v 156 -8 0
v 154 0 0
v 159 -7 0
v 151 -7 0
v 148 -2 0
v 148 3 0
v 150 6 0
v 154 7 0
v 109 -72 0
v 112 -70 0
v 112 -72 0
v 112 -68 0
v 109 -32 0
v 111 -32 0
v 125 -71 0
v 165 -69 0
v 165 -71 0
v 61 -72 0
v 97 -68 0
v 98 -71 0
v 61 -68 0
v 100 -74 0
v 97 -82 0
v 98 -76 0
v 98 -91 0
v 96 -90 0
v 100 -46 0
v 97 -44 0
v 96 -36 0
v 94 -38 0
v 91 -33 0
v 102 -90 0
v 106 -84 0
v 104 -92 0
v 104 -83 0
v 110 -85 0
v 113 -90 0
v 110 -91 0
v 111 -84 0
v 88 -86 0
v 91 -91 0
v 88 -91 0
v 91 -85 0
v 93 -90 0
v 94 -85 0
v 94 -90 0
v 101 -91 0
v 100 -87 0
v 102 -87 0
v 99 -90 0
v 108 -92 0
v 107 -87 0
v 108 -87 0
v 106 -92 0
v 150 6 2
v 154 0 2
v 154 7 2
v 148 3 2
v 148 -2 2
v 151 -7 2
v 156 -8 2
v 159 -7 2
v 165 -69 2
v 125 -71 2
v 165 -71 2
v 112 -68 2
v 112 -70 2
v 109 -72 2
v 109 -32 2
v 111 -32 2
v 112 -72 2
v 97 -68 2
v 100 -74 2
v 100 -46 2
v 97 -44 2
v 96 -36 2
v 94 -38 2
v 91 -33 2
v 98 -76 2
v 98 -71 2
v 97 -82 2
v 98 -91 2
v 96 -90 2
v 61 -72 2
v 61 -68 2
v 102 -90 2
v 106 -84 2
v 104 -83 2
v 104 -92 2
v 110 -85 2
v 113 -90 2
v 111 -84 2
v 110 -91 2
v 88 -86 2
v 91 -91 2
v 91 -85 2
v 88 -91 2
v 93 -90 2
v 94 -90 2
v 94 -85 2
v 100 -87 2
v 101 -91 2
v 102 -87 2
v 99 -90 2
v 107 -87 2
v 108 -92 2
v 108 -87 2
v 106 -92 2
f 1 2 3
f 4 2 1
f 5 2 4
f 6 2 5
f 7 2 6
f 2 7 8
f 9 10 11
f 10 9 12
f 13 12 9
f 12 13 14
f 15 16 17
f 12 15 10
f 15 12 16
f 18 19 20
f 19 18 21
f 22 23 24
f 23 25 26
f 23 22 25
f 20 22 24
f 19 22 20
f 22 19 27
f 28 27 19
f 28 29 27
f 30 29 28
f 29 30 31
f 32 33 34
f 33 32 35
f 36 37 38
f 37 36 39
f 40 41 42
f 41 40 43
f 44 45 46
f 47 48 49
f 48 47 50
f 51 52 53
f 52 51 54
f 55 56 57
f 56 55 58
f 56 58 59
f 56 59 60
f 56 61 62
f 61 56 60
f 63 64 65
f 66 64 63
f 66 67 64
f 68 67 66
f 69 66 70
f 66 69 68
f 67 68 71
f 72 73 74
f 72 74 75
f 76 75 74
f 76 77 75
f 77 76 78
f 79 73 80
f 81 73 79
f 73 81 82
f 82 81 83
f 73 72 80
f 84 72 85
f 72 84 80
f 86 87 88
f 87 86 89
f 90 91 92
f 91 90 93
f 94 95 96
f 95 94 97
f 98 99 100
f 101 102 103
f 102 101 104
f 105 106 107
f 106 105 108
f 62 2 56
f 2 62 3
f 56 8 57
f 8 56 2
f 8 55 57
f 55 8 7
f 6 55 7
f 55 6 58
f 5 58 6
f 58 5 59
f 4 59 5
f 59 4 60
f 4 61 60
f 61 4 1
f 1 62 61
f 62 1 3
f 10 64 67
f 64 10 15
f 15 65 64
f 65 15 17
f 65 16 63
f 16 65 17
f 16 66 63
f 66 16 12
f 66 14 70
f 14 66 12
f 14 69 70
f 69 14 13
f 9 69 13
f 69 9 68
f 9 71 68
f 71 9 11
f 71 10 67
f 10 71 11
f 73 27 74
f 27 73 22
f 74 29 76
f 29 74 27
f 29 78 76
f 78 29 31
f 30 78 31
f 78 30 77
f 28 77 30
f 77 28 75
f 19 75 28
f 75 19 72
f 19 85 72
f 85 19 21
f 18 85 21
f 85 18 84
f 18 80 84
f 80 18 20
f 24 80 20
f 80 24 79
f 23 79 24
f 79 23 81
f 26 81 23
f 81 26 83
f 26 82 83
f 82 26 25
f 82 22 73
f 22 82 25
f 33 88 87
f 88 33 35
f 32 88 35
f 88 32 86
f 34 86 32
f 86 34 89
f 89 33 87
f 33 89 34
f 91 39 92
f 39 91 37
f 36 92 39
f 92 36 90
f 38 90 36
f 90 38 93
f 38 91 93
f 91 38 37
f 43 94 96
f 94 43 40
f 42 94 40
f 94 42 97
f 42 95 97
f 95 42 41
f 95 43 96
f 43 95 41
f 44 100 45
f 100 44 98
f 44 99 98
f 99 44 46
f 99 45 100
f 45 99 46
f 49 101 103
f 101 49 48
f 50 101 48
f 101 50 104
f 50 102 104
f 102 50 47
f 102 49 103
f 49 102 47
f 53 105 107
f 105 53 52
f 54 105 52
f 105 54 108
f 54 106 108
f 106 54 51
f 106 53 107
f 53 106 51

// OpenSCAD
//start
module  child() 
{ 
color  ([0.2,0.8,0.4]) 
{ 
            polygon(points = [
[126.00,-59.00]
,[126.00,-56.00]
,[129.00,-55.00]
,[131.00,-54.00]
,[134.00,-54.00]
,[136.00,-55.00]
,[137.00,-56.00]
,[139.00,-58.00]
,[140.00,-61.00]
,[139.00,-65.00]
,[136.00,-67.00]
,[134.00,-68.00]
,[136.00,-70.00]
,[138.00,-72.00]
,[139.00,-75.00]
,[139.00,-79.00]
,[140.00,-81.00]
,[140.00,-82.00]
,[138.00,-83.00]
,[136.00,-82.00]
,[135.00,-82.00]
,[136.00,-80.00]
,[134.00,-75.00]
,[135.00,-79.00]
,[137.00,-85.00]
,[138.00,-88.00]
,[138.00,-89.00]
,[137.00,-91.00]
,[134.00,-91.00]
,[131.00,-91.00]
,[128.00,-90.00]
,[130.00,-89.00]
,[126.00,-89.00]
,[124.00,-88.00]
,[127.00,-88.00]
,[126.00,-84.00]
,[127.00,-81.00]
,[126.00,-77.00]
,[124.00,-77.00]
,[123.00,-79.00]
,[121.00,-79.00]
,[118.00,-78.00]
,[118.00,-77.00]
,[112.00,-73.00]
,[111.00,-72.00]
,[114.00,-72.00]
,[119.00,-74.00]
,[122.00,-75.00]
,[128.00,-69.00]
,[124.00,-67.00]
,[123.00,-64.00]
,[124.00,-62.00]
,[124.00,-61.00]
,[126.00,-60.00]
]
,paths = [
[0,1,2,3,4,5,6,7,8,9,10,11,12,13,14,15,16,17,18,19,20,21,22,23,24,25,26,27,28,29,30,31,32,33,34,35,36,37,38,39,40,41,42,43,44,45,46,47,48,49,50,51,52,53]]
            );
}
}
//start
module  background() 
{ 
color  ([0,1,0.4]) 
{ 
            polygon(points = [
[150.00,6.00]
,[148.00,3.00]
,[148.00,-2.00]
,[151.00,-7.00]
,[156.00,-8.00]
,[159.00,-7.00]
,[154.00,0.00]
,[154.00,7.00]
,[91.00,-33.00]
,[94.00,-38.00]
,[97.00,-44.00]
,[97.00,-52.00]
,[97.00,-60.00]
,[97.00,-68.00]
,[61.00,-68.00]
,[61.00,-72.00]
,[98.00,-71.00]
,[98.00,-76.00]
,[97.00,-82.00]
,[96.00,-90.00]
,[98.00,-91.00]
,[100.00,-74.00]
,[100.00,-46.00]
,[96.00,-36.00]
,[88.00,-86.00]
,[88.00,-91.00]
,[91.00,-91.00]
,[91.00,-85.00]
,[94.00,-85.00]
,[94.00,-90.00]
,[93.00,-90.00]
,[102.00,-87.00]
,[101.00,-91.00]
,[99.00,-90.00]
,[100.00,-87.00]
,[106.00,-84.00]
,[104.00,-92.00]
,[102.00,-90.00]
,[104.00,-83.00]
,[107.00,-87.00]
,[108.00,-87.00]
,[108.00,-92.00]
,[106.00,-92.00]
,[110.00,-91.00]
,[113.00,-90.00]
,[111.00,-84.00]
,[110.00,-85.00]
,[109.00,-32.00]
,[109.00,-69.00]
,[109.00,-72.00]
,[112.00,-72.00]
,[112.00,-70.00]
,[125.00,-71.00]
,[165.00,-71.00]
,[165.00,-69.00]
,[112.00,-68.00]
,[111.00,-32.00]
]
,paths = [
[0,1,2,3,4,5,6,7],[8,9,10,11,12,13,14,15,16,17,18,19,20,21,22,23],[24,25,26,27],[28,29,30],[31,32,33,34],[35,36,37,38],[39,40,41,42],[43,44,45,46],[47,48,49,50,51,52,53,54,55,56]]
            );
}
}

linear_extrude(height = 3){
translate([0, 0, 7]) child();
}
linear_extrude(height = 2){
background();
}
